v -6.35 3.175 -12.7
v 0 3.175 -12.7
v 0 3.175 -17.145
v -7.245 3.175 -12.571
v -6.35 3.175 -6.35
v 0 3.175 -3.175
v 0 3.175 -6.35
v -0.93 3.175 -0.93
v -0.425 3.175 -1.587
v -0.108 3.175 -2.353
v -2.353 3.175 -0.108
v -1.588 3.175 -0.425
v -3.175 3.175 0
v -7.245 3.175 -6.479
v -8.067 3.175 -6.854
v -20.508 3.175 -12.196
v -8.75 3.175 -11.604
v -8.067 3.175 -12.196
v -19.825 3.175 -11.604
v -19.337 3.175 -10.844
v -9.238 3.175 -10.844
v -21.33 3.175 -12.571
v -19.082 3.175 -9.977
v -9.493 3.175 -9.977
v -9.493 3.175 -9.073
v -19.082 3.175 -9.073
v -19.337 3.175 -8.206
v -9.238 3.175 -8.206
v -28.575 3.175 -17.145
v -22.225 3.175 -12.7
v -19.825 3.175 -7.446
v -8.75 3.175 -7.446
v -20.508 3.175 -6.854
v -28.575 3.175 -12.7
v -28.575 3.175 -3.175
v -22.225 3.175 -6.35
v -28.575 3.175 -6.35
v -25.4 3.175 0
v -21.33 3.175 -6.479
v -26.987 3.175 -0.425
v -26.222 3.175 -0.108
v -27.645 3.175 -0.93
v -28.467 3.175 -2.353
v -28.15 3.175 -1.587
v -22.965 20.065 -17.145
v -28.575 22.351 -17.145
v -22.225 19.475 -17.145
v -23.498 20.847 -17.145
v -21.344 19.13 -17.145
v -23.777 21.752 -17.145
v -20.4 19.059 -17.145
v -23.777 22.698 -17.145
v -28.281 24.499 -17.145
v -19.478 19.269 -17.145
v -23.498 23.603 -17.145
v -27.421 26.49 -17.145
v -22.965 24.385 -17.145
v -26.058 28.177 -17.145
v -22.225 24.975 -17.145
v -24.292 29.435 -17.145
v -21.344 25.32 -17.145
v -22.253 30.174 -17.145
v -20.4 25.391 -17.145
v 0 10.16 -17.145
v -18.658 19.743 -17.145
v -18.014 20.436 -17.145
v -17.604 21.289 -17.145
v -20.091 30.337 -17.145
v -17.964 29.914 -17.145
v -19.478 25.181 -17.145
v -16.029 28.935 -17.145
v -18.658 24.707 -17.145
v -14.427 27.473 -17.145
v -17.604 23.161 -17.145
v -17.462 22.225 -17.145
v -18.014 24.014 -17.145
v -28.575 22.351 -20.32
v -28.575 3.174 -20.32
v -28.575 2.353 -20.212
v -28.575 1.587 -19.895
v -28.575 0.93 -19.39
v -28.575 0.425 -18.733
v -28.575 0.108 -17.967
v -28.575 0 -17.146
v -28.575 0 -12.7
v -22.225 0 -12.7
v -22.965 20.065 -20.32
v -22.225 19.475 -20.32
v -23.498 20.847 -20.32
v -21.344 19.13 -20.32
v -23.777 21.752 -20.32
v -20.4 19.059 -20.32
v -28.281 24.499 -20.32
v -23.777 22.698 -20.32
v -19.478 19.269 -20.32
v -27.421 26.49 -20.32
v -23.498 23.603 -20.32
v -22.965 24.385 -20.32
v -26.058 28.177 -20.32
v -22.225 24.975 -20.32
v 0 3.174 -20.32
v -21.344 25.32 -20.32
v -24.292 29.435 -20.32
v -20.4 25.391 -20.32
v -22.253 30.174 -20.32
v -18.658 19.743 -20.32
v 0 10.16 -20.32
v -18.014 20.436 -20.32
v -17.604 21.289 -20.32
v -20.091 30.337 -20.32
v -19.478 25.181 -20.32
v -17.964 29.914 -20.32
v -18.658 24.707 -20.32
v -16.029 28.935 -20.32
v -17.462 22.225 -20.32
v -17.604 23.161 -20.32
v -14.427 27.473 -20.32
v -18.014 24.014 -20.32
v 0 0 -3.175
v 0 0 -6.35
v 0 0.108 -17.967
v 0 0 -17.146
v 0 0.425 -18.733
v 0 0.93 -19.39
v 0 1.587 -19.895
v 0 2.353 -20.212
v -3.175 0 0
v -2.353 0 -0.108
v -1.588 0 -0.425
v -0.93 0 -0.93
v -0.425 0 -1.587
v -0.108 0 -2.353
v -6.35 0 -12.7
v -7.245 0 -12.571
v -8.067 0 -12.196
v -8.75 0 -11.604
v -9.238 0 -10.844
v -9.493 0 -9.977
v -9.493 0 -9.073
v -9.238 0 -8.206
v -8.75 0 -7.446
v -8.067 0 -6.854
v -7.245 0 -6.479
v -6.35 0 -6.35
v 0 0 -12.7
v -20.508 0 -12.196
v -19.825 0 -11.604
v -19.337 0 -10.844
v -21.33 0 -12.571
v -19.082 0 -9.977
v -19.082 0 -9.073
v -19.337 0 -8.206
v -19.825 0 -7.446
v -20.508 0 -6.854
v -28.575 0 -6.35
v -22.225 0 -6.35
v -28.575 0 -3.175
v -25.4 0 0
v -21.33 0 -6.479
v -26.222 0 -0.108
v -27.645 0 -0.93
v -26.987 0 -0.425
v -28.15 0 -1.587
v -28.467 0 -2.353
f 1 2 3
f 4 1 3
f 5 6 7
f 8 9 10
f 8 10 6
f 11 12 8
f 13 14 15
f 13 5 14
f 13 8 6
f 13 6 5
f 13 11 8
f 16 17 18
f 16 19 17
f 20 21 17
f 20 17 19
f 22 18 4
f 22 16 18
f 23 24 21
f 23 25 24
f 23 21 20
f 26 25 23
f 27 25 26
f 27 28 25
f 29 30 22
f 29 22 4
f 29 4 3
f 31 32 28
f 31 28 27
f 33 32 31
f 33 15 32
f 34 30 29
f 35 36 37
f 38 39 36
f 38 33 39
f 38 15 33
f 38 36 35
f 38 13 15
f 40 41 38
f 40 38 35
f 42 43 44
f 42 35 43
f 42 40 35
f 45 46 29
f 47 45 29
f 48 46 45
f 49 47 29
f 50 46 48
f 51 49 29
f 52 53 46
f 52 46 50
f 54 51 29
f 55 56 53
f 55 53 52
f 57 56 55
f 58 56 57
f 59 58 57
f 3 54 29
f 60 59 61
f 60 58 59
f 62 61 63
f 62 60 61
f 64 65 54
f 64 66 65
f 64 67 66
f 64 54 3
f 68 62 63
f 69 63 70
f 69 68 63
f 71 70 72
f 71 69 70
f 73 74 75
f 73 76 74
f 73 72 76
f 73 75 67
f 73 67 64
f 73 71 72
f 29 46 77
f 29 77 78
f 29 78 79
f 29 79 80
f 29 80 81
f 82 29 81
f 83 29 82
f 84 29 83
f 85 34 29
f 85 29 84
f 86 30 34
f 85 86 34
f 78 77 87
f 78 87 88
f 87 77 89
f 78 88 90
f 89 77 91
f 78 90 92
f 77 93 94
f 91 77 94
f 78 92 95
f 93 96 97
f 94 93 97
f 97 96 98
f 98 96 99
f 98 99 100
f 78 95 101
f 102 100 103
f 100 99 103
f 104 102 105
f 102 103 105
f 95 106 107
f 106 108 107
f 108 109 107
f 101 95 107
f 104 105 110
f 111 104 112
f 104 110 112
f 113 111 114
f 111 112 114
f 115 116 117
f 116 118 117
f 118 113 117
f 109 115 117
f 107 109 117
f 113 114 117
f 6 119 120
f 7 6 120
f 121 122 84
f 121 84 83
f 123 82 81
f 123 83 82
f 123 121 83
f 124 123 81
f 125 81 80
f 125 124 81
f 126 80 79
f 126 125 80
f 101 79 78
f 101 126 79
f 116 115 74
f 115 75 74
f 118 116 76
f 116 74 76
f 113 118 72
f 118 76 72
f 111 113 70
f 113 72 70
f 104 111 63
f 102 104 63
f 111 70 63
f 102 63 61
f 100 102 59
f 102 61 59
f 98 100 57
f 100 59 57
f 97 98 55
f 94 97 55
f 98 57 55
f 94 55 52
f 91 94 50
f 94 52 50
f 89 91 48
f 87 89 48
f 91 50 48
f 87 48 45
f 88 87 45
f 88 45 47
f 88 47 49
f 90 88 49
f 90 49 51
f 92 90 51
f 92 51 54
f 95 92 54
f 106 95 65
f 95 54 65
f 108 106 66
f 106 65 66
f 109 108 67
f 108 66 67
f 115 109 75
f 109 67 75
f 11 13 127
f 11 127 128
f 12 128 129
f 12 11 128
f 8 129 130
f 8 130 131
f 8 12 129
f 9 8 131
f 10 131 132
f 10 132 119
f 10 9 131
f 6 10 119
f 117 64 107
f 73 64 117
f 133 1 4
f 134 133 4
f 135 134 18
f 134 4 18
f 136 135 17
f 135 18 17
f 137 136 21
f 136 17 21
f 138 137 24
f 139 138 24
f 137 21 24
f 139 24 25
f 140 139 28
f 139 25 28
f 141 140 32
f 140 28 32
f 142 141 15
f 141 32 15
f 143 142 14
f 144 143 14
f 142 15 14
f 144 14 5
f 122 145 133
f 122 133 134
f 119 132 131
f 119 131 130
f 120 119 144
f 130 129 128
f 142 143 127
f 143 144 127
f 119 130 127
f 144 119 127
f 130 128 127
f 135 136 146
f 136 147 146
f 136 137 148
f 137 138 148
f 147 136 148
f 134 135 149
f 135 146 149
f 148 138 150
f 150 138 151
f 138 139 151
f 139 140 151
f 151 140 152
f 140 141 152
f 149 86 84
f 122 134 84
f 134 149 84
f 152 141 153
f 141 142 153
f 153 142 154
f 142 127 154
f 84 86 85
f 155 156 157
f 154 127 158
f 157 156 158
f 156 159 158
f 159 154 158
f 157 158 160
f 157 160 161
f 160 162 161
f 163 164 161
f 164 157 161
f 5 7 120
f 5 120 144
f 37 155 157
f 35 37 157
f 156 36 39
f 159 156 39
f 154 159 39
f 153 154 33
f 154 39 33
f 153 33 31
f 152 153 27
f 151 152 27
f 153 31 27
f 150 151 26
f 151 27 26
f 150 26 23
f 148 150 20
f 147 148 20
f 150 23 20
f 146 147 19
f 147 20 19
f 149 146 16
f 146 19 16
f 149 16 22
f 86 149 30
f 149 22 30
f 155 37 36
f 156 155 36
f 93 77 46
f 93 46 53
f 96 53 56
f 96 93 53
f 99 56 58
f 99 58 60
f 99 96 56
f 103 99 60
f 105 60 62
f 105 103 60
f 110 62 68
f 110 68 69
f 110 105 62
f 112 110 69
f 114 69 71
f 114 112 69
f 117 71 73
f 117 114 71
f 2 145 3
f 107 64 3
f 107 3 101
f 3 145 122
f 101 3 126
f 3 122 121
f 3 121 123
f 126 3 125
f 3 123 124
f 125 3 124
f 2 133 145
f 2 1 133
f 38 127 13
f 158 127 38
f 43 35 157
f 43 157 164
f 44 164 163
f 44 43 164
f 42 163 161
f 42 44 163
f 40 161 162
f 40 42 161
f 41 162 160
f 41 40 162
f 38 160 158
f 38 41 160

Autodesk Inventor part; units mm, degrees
ref_plane "YZ Plane" through (0, 0, 0) normal (1, 0, 0) x (0, 1, 0)
ref_plane "XZ Plane" through (0, 0, 0) normal (0, 1, 0) x (-1, 0, 0)
ref_plane "XY Plane" through (0, 0, 0) normal (0, 0, 1) x (1, 0, 0)
sketch "Sketch1" plane through (0, 0, 0) normal (0, 1, 0) x (-1, 0, 0)
  line L0 (0, 0) -> (28.575, 0)
  line L1 (28.575, 0) -> (28.575, -20.32)
  line L2 (28.575, -20.32) -> (0, -20.32)
  line L3 (0, -20.32) -> (0, 0)
  dimension "d0" = 28.575
  dimension "d1" = 20.32
extrude "Extrusion1" add sketch "Sketch1" along normal blind 3.175
fillet "Fillet1" radius 3.175 1 edges at (-14.2875, 0, -20.32)
fillet "Fillet2" radius 3.175 1 edges at (0, 1.5875, 0)
fillet "Fillet3" radius 3.175 1 edges at (-28.575, 1.5875, 0)
sketch "Sketch2" plane through (0, 3.175, 0) normal (0, 1, 0) x (1, 0, 0)
  line L0 (-28.575, 20.32) -> (-28.575, 3.175) projected
  line L1 (0, 3.175) -> (0, 20.32) projected
  line L2 (-28.575, 20.32) -> (0, 20.32)
  line L3 (0, 20.32) -> (0, 17.145)
  line L4 (0, 17.145) -> (-28.575, 17.145)
  line L5 (-28.575, 17.145) -> (-28.575, 20.32)
  point P0 (0, 0)
  dimension "d7" = 3.175
extrude "Extrusion2" add sketch "Sketch2" along normal blind 6.985
sketch "Sketch3" plane through (0, 3.175, 0) normal (0, 1, 0) x (1, 0, 0)
  line L0 (0, 17.145) -> (0, 3.175) projected
  line L1 (0, 6.35) -> (-6.35, 6.35)
  line L2 (-6.35, 6.35) -> (-6.35, 12.7)
  line L3 (-6.35, 12.7) -> (0, 12.7)
  line L4 (0, 12.7) -> (0, 6.35)
  line L5 (-28.575, 3.175) -> (-28.575, 17.145) projected
  line L6 (-28.575, 6.35) -> (-22.225, 6.35)
  line L7 (-22.225, 6.35) -> (-22.225, 12.7)
  line L8 (-22.225, 12.7) -> (-28.575, 12.7)
  line L9 (-28.575, 12.7) -> (-28.575, 6.35)
  line L10 (-25.4, 0) -> (-3.175, 0) projected
  line L11 (0, 20.32) -> (-28.575, 20.32) projected
  circle A0 centre (-6.35, 9.525) radius 3.175
  circle A1 centre (-22.225, 9.525) radius 3.175
  point P0 (0, 0)
  dimension "d10" = 6.35
  dimension "d11" = 7.62
  dimension "d12" = 6.35
  dimension "d13" = 6.35
extrude "Extrusion3" cut sketch "Sketch3" against normal blind 25.4
sketch "Sketch4" plane through (-28.575, 3.175, -17.145) normal (0, 0, 1) x (1, 0, 0)
  line L0 (0, 0) -> (0, 6.985) projected
  line L1 (0, 6.985) -> (28.4507, 6.985)
  line L2 (28.575, 0) -> (0, 0) projected
  line L3 (28.575, -3.175) -> (0, -3.175) projected
  dimension "d16" = 6.985
  dimension "d17" = 10.16
sketch "Sketch5" plane through (-28.575, 3.175, -17.145) normal (0, 0, 1) x (1, 0, 0)
  line L0 (28.575, 0) -> (28.575, 6.985) projected
  line L1 (28.575, 6.985) -> (0, 41.275)
  line L2 (28.575, -3.175) -> (0, -3.175) projected
  line L3 (0, 0) -> (0, 6.985) projected
  line L4 (28.575, 0) -> (0, 0) projected
  line L5 (0, 41.275) -> (0, 6.985)
  line L6 (0, 0) -> (0, 6.985) projected
  line L7 (0, 6.985) -> (28.575, 6.985)
  dimension "d18" = 44.45
  dimension "d19" = 0
  dimension "d20" = 6.985
  dimension "d21" = 6.985
extrude "Extrusion4" add sketch "Sketch5" against normal blind 3.175 contours L7 L5 L1
sketch "Sketch6" plane through (-28.575, 3.175, -17.145) normal (0, 0, 1) x (1, 0, 0)
  circle A0 centre (7.9375, 19.05) radius 3.175
  line L0 (28.575, -3.175) -> (0, -3.175) projected
  line L1 (0, 0) -> (0, 41.275) projected
  dimension "d24" = 22.225
  dimension "d25" = 7.9375
  dimension "d26" = 6.35
extrude "Extrusion5" cut sketch "Sketch6" against normal blind 3.175
sketch "Sketch7" plane through (-28.575, 3.175, -17.145) normal (0, 0, 1) x (1, 0, 0)
  line L0 (0, 0) -> (0, 41.275) projected
  line L1 (28.575, 6.985) -> (0, 41.275) projected
  circle A0 centre (7.9375, 19.05) radius 3.175 projected
  point P0 (28.575, -3.175)
fillet "Fillet4" radius 8.001 1 edges at (-28.575, 44.45, -18.7325)
properties part number "LeftPinAtttachments-1111-2019"
